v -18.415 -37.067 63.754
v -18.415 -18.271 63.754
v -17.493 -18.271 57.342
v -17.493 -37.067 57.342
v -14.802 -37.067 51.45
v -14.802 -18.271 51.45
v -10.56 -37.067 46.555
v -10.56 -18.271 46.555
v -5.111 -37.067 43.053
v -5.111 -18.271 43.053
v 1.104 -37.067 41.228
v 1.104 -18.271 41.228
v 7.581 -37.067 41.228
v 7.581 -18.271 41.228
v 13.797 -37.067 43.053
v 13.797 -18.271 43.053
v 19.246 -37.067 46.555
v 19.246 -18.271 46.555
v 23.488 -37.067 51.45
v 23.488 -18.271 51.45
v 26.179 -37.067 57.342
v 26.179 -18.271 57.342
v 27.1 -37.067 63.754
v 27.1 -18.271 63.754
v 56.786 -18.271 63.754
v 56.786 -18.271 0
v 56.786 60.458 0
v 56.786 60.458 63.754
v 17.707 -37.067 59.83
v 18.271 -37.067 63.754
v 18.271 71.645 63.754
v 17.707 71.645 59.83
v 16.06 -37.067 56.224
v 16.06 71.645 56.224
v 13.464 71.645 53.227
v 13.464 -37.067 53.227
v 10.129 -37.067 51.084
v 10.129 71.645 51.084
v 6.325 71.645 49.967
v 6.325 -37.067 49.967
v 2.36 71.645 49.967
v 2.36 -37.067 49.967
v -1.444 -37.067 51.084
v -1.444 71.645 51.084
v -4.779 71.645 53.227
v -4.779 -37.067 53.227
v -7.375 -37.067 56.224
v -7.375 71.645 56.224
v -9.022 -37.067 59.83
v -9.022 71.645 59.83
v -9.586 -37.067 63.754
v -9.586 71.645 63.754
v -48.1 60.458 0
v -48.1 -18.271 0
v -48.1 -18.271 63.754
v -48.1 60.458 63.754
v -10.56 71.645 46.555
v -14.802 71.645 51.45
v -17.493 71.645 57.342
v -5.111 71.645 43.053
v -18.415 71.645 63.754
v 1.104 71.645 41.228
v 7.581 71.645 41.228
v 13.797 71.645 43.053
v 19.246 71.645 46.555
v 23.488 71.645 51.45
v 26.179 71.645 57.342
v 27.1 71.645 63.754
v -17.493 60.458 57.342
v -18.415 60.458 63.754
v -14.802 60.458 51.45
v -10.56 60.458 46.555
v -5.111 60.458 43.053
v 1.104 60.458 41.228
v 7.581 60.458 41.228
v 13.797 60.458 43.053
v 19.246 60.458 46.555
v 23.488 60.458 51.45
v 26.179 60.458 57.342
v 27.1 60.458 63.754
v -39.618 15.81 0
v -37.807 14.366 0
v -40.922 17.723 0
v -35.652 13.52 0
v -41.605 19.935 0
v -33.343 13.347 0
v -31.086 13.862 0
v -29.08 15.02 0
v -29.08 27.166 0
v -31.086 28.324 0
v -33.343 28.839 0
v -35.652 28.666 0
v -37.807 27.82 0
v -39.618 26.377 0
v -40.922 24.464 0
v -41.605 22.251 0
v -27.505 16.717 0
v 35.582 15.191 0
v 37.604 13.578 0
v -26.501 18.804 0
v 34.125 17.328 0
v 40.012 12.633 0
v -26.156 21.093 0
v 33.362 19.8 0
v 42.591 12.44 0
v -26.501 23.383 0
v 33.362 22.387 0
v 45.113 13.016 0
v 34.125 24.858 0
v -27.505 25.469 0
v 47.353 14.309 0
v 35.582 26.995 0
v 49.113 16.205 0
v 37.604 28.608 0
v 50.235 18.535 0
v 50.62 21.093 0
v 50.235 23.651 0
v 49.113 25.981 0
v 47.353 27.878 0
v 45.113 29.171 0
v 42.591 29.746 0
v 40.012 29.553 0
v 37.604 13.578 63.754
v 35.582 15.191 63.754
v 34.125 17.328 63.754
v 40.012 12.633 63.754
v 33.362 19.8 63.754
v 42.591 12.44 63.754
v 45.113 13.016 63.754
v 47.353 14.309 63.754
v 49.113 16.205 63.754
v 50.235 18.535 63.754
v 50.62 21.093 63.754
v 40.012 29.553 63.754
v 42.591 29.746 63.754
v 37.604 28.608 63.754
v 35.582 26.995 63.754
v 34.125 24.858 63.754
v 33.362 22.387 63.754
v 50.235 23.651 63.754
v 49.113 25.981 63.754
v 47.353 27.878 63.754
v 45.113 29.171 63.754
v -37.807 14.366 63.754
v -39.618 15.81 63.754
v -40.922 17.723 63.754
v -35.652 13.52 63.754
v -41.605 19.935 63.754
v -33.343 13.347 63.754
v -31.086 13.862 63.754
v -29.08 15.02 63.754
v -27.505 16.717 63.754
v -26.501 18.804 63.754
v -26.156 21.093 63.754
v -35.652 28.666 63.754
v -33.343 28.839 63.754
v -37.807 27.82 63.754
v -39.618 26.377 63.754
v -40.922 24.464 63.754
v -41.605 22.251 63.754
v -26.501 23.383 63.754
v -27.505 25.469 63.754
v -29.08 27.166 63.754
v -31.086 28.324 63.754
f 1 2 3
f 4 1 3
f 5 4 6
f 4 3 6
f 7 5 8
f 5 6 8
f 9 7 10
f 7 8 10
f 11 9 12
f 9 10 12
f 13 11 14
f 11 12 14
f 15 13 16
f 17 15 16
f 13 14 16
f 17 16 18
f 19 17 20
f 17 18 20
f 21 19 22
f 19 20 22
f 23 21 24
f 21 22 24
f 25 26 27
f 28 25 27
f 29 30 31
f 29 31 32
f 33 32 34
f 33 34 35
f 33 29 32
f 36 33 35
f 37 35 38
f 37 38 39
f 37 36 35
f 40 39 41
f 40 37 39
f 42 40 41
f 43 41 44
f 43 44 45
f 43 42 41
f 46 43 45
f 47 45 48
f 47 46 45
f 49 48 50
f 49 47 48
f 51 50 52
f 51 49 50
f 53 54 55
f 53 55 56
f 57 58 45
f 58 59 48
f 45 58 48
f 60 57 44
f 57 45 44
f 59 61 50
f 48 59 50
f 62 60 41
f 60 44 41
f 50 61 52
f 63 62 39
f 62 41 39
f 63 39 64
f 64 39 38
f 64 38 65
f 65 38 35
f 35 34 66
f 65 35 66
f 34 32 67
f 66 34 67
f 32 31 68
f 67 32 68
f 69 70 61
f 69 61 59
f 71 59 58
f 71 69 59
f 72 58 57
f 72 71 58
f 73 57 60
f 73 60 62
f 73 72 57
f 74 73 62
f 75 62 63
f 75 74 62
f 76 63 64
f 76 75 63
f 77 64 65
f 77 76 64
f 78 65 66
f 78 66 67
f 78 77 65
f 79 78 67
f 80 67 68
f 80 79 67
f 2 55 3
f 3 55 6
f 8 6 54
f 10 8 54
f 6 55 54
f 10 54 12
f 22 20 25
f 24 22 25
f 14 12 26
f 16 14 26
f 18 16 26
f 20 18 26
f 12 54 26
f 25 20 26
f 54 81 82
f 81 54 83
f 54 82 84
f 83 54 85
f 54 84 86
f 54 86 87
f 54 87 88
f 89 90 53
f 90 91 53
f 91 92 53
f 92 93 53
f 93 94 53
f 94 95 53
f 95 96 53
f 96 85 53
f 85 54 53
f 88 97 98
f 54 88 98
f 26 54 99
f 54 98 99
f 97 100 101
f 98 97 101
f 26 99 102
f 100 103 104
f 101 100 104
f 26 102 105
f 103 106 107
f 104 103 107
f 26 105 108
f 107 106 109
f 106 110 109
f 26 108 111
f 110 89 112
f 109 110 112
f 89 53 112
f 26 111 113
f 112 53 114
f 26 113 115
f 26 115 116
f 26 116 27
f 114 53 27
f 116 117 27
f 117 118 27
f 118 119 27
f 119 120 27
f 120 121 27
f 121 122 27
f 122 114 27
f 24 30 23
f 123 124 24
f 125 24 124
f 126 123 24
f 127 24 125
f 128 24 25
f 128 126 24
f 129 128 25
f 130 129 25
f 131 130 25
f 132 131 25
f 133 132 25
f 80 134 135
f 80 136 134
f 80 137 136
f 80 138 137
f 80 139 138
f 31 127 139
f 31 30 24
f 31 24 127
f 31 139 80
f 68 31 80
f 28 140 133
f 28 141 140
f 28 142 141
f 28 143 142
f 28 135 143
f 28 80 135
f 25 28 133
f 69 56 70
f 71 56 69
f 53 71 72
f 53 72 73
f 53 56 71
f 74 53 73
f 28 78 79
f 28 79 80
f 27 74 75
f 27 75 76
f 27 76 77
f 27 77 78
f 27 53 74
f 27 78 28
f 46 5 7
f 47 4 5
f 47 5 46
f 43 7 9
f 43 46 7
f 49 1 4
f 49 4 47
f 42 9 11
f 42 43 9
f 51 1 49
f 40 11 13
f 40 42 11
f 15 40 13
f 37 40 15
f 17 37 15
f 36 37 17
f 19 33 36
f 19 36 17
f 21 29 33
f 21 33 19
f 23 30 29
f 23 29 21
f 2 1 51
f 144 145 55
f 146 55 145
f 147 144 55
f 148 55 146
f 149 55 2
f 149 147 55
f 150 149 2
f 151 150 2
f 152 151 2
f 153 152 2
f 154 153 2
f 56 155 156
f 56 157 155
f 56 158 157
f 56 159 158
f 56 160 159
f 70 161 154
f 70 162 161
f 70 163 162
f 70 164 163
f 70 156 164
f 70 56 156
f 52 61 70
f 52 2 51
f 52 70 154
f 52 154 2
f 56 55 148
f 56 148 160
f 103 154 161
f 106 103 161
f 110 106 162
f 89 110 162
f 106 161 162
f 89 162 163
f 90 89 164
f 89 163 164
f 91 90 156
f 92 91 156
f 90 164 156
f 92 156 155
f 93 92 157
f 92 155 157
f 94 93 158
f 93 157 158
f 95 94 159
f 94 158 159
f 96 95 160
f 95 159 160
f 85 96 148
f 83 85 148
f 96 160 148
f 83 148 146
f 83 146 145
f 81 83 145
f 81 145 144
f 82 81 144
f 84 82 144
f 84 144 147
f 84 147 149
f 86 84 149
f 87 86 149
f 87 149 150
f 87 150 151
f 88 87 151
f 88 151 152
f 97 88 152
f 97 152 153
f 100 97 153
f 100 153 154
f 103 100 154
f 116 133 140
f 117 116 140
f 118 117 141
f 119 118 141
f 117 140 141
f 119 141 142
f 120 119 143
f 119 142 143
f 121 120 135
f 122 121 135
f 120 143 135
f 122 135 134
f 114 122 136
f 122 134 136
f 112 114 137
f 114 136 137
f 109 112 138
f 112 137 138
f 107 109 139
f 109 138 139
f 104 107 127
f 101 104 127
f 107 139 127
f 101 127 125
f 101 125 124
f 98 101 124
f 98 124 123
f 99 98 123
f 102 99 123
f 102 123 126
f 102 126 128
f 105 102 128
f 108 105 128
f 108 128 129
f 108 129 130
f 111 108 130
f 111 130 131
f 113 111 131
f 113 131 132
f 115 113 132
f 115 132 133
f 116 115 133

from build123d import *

# Parameters (mm, degrees)
F0_W     = 104.885712266
F0_H     = 78.7287391722
F1_DEPTH = 63.754
F3_DEPTH = 18.796
F4_DEPTH = 105.156
F5_DEPTH = 108.712
F6_R     = 7.7678468682
F6_R_2   = 8.6774880562
F7_DEPTH = 90.17


with BuildPart() as f1:
    # F0 (on Top) → F1 (new body)
    with BuildSketch(Plane.XY):
        with Locations((4.3426826596, 21.0932102054)):
            Rectangle(F0_W, F0_H)
    extrude(amount=F1_DEPTH)

    # F2 (on face) → F3 (join)
    with BuildSketch(Plane.XZ.offset(18.2711593807)):
        with BuildLine():
            Line((-9.586125523, 63.754), (-18.415103221, 63.754))
            ThreePointArc((-18.415103221, 63.754), (4.3426826596, 40.9962141193), (27.1004685403, 63.754))
            Line((27.1004685403, 63.754), (18.2714908423, 63.754))
            ThreePointArc((18.2714908423, 63.754), (4.3426826596, 49.8251918173), (-9.586125523, 63.754))
        make_face()
    extrude(amount=F3_DEPTH)

    # F4 (cut): a face of the model
    f4_faces = [f1.faces().sort_by_distance(p)[0] for p in [
        (4.3426826596, -18.2711593807, 57.8424302036),
    ]]
    extrude(f4_faces, amount=-F4_DEPTH, mode=Mode.SUBTRACT)

    # F5 (add): a face of the model
    f5_faces = [f1.faces().sort_by_distance(p)[0] for p in [
        (22.6859796913, -37.0671593807, 63.2451204375),
    ]]
    extrude(f5_faces, amount=-F5_DEPTH)

    # F6 (on face) → F7 (cut)
    with BuildSketch(Plane.XY.offset(63.754)):
        with Locations((-33.9234930099, 21.0932102054)):
            Circle(F6_R)
        with Locations((41.9430036665, 21.0932102054)):
            Circle(F6_R_2)
    extrude(amount=-F7_DEPTH, mode=Mode.SUBTRACT)


solid = f1.part
